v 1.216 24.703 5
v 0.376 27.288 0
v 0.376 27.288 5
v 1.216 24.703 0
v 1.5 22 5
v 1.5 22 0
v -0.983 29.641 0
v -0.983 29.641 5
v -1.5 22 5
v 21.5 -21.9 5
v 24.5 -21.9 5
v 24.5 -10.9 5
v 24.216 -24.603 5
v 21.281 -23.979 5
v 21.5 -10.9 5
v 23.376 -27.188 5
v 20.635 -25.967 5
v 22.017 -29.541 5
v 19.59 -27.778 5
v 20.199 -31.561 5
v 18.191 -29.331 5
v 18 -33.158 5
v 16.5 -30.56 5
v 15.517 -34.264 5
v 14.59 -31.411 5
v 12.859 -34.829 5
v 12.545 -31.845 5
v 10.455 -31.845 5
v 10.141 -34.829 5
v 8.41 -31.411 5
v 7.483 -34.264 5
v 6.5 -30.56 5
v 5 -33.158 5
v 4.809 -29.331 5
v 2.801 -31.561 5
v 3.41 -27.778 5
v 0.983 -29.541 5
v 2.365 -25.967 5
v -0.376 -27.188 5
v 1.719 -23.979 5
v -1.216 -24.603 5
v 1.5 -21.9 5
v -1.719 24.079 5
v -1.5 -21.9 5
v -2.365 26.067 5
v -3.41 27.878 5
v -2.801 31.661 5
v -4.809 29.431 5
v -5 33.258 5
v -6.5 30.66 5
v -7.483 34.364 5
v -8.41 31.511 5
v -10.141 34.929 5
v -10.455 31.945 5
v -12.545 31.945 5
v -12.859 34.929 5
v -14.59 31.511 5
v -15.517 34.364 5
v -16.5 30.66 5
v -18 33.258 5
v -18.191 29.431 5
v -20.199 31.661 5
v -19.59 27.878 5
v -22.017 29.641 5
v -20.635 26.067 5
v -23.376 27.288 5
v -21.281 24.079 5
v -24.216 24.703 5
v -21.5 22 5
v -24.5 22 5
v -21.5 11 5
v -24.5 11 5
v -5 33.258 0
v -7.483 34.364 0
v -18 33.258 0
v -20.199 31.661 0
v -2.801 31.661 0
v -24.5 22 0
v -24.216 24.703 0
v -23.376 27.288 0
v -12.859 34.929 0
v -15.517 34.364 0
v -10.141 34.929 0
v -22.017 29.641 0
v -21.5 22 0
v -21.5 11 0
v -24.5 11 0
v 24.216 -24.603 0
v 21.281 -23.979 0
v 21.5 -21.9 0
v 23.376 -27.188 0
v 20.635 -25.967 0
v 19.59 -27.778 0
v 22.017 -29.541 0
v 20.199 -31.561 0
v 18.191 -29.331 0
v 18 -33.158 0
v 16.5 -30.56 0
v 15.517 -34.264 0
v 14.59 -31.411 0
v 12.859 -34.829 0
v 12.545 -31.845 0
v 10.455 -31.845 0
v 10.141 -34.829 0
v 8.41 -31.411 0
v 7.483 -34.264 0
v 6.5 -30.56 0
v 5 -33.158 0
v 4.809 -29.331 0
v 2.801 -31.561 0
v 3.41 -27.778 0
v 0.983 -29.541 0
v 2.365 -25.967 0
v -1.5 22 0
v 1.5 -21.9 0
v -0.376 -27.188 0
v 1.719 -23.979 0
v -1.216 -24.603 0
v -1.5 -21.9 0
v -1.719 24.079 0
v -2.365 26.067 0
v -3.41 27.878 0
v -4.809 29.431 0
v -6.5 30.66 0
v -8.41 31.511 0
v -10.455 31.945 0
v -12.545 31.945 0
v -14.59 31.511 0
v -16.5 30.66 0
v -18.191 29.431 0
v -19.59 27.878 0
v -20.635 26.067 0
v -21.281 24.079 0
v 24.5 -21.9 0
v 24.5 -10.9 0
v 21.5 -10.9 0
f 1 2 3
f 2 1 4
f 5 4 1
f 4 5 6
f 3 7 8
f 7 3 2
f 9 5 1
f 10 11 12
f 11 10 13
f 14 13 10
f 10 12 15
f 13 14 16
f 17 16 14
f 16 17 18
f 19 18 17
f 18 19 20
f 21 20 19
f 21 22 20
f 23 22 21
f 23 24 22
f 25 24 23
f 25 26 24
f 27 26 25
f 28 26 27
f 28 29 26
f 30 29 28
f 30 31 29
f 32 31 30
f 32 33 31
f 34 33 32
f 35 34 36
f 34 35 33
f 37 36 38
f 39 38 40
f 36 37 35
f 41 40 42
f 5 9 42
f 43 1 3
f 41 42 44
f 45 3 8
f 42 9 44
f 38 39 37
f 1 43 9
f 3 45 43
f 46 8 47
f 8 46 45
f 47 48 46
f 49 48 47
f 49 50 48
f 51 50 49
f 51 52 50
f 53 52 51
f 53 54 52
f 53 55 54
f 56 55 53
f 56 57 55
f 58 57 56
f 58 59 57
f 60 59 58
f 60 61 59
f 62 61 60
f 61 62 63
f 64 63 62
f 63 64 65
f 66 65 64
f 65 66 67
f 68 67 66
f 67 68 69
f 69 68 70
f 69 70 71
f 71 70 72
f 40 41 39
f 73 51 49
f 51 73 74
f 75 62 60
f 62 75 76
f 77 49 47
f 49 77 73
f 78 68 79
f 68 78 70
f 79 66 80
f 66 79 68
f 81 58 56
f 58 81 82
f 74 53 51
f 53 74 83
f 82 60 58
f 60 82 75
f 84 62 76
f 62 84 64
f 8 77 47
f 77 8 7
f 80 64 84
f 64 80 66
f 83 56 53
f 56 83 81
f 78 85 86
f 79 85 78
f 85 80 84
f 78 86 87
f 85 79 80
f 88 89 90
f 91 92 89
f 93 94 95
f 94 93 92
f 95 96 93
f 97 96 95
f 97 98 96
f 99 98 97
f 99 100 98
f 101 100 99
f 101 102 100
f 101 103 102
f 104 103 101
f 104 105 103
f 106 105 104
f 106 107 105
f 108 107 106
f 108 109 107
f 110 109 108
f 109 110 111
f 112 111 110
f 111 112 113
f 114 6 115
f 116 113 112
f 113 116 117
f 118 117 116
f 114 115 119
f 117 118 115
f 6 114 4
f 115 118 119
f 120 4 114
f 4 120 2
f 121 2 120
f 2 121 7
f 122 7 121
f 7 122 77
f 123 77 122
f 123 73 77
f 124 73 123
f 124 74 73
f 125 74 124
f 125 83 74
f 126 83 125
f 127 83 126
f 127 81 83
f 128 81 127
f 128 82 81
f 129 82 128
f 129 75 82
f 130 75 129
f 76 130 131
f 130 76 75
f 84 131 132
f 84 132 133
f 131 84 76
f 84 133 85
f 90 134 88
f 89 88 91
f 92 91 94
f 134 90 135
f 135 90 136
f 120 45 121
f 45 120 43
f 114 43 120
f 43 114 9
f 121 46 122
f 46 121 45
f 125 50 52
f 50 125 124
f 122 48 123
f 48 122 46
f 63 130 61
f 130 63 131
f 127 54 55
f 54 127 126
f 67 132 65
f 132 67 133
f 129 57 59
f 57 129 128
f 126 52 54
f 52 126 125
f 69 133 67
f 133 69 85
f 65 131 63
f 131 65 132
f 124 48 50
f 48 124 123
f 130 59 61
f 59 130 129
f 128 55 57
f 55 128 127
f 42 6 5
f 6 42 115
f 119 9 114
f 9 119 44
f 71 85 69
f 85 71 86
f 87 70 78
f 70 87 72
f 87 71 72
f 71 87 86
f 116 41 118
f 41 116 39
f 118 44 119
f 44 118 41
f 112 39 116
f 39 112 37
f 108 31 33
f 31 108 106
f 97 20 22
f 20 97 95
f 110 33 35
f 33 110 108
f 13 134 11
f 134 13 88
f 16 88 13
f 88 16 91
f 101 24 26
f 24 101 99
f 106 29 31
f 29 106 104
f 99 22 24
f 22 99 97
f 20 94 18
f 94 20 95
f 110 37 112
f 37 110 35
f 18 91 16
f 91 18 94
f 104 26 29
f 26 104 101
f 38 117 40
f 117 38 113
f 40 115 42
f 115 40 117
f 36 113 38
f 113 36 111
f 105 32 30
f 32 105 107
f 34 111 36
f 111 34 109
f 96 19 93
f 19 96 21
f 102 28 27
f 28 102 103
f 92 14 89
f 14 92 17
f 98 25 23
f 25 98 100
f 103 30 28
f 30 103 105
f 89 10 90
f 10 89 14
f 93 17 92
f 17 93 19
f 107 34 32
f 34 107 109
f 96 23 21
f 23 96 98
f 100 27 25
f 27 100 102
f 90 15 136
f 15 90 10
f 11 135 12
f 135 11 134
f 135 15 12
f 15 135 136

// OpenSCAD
//----------------------------------------------------------------------------
//  Ikea hook clone, by Juan Gonzalez Gomez (Obijuan)
//  (c) Jan 2012.
//  GPL license
//----------------------------------------------------------------------------


//-----------------------------------------------------------------
//-- Simple part for making the hook. 
//-- It is a half ring
//-- diam: ring's diameter
//-- width: ring's width
//-- heigth: ring's heigth
//----------------------------------------------------------
module half_ring(diam, width, height)
{
  difference() {
     //-- outer cylinder
     cylinder (r=(diam + 2*width)/2, h=heigth, center=true);

    //-- Inner cylinder
    cylinder (r=diam/2, h=heigth+10, center=true);

   //-- Cut the cylinder in half (one half is removed)
   translate([0,-(diam+2)/2,0])
      cube([diam+2*width+10, diam+2, heigth+10],center=true);
  }
}


//------------------------------------------------------
//-- A simple hook
//-- diam = hook internal diamenter
//-- length = total length (in the y axis)
//-- width = thickness in the x axis
//-- heigth = thickness in the z axis
//-------------------------------------------------------
module hook(diam, length, width, heigth)
{

  //-- The hook is composed by the union of a half-circle,
  //-- and two legs (one longer). The leg's length are  dist and dist/2

  //-- Calculate the hook's long leg length
  dist = length - diam/2 -width;
 
  union() {

    //-- Half ring
    translate([(-diam-width)/2, dist,0])
     half_ring(diam=diam, width=width, heigth=heigth);

    //-- Longer leg
    translate([0, dist/2,0])
      cube([width, dist, heigth],center=true);

    //-- shorter leg
     translate([-diam-width, dist/2 + dist/4,0])
        cube([width, dist/2, heigth], center=true);
    }
}


//-----------------------------------------------------
//  Ikea hook. Main module         
//  diam: Hook interna diameter
//  length: Total distance in the y axis 
//  width: thickness in the x axis
// height: thickness in the z axis  
//----------------------------------------------------
module ikea_hook(diam = 20, length=70, width=3, heigth=5)
{
  
//-- The ikea hook is composed of two equal hooks. One hook is obtained from the
//-- other aplying a rotation around the y and x axis (180 degrees)

  //-- Put the hook on the ground
  translate([0,0,heigth/2])

    //-- Union of the two hooks
    union() {
      //-- First hook
      hook(diam=diam, length=length/2, width=width, heigth=heigth);

     //-- Second hook
      translate([0,0.1,0]) //-- Just to make sure the two hooks form one part
      rotate([180,0,0])
        rotate([0,180,0])
         hook(diam=diam, length=length/2, width=width, heigth=heigth);
   }
}


//-- The standar Ikea hook!!!!
ikea_hook();
